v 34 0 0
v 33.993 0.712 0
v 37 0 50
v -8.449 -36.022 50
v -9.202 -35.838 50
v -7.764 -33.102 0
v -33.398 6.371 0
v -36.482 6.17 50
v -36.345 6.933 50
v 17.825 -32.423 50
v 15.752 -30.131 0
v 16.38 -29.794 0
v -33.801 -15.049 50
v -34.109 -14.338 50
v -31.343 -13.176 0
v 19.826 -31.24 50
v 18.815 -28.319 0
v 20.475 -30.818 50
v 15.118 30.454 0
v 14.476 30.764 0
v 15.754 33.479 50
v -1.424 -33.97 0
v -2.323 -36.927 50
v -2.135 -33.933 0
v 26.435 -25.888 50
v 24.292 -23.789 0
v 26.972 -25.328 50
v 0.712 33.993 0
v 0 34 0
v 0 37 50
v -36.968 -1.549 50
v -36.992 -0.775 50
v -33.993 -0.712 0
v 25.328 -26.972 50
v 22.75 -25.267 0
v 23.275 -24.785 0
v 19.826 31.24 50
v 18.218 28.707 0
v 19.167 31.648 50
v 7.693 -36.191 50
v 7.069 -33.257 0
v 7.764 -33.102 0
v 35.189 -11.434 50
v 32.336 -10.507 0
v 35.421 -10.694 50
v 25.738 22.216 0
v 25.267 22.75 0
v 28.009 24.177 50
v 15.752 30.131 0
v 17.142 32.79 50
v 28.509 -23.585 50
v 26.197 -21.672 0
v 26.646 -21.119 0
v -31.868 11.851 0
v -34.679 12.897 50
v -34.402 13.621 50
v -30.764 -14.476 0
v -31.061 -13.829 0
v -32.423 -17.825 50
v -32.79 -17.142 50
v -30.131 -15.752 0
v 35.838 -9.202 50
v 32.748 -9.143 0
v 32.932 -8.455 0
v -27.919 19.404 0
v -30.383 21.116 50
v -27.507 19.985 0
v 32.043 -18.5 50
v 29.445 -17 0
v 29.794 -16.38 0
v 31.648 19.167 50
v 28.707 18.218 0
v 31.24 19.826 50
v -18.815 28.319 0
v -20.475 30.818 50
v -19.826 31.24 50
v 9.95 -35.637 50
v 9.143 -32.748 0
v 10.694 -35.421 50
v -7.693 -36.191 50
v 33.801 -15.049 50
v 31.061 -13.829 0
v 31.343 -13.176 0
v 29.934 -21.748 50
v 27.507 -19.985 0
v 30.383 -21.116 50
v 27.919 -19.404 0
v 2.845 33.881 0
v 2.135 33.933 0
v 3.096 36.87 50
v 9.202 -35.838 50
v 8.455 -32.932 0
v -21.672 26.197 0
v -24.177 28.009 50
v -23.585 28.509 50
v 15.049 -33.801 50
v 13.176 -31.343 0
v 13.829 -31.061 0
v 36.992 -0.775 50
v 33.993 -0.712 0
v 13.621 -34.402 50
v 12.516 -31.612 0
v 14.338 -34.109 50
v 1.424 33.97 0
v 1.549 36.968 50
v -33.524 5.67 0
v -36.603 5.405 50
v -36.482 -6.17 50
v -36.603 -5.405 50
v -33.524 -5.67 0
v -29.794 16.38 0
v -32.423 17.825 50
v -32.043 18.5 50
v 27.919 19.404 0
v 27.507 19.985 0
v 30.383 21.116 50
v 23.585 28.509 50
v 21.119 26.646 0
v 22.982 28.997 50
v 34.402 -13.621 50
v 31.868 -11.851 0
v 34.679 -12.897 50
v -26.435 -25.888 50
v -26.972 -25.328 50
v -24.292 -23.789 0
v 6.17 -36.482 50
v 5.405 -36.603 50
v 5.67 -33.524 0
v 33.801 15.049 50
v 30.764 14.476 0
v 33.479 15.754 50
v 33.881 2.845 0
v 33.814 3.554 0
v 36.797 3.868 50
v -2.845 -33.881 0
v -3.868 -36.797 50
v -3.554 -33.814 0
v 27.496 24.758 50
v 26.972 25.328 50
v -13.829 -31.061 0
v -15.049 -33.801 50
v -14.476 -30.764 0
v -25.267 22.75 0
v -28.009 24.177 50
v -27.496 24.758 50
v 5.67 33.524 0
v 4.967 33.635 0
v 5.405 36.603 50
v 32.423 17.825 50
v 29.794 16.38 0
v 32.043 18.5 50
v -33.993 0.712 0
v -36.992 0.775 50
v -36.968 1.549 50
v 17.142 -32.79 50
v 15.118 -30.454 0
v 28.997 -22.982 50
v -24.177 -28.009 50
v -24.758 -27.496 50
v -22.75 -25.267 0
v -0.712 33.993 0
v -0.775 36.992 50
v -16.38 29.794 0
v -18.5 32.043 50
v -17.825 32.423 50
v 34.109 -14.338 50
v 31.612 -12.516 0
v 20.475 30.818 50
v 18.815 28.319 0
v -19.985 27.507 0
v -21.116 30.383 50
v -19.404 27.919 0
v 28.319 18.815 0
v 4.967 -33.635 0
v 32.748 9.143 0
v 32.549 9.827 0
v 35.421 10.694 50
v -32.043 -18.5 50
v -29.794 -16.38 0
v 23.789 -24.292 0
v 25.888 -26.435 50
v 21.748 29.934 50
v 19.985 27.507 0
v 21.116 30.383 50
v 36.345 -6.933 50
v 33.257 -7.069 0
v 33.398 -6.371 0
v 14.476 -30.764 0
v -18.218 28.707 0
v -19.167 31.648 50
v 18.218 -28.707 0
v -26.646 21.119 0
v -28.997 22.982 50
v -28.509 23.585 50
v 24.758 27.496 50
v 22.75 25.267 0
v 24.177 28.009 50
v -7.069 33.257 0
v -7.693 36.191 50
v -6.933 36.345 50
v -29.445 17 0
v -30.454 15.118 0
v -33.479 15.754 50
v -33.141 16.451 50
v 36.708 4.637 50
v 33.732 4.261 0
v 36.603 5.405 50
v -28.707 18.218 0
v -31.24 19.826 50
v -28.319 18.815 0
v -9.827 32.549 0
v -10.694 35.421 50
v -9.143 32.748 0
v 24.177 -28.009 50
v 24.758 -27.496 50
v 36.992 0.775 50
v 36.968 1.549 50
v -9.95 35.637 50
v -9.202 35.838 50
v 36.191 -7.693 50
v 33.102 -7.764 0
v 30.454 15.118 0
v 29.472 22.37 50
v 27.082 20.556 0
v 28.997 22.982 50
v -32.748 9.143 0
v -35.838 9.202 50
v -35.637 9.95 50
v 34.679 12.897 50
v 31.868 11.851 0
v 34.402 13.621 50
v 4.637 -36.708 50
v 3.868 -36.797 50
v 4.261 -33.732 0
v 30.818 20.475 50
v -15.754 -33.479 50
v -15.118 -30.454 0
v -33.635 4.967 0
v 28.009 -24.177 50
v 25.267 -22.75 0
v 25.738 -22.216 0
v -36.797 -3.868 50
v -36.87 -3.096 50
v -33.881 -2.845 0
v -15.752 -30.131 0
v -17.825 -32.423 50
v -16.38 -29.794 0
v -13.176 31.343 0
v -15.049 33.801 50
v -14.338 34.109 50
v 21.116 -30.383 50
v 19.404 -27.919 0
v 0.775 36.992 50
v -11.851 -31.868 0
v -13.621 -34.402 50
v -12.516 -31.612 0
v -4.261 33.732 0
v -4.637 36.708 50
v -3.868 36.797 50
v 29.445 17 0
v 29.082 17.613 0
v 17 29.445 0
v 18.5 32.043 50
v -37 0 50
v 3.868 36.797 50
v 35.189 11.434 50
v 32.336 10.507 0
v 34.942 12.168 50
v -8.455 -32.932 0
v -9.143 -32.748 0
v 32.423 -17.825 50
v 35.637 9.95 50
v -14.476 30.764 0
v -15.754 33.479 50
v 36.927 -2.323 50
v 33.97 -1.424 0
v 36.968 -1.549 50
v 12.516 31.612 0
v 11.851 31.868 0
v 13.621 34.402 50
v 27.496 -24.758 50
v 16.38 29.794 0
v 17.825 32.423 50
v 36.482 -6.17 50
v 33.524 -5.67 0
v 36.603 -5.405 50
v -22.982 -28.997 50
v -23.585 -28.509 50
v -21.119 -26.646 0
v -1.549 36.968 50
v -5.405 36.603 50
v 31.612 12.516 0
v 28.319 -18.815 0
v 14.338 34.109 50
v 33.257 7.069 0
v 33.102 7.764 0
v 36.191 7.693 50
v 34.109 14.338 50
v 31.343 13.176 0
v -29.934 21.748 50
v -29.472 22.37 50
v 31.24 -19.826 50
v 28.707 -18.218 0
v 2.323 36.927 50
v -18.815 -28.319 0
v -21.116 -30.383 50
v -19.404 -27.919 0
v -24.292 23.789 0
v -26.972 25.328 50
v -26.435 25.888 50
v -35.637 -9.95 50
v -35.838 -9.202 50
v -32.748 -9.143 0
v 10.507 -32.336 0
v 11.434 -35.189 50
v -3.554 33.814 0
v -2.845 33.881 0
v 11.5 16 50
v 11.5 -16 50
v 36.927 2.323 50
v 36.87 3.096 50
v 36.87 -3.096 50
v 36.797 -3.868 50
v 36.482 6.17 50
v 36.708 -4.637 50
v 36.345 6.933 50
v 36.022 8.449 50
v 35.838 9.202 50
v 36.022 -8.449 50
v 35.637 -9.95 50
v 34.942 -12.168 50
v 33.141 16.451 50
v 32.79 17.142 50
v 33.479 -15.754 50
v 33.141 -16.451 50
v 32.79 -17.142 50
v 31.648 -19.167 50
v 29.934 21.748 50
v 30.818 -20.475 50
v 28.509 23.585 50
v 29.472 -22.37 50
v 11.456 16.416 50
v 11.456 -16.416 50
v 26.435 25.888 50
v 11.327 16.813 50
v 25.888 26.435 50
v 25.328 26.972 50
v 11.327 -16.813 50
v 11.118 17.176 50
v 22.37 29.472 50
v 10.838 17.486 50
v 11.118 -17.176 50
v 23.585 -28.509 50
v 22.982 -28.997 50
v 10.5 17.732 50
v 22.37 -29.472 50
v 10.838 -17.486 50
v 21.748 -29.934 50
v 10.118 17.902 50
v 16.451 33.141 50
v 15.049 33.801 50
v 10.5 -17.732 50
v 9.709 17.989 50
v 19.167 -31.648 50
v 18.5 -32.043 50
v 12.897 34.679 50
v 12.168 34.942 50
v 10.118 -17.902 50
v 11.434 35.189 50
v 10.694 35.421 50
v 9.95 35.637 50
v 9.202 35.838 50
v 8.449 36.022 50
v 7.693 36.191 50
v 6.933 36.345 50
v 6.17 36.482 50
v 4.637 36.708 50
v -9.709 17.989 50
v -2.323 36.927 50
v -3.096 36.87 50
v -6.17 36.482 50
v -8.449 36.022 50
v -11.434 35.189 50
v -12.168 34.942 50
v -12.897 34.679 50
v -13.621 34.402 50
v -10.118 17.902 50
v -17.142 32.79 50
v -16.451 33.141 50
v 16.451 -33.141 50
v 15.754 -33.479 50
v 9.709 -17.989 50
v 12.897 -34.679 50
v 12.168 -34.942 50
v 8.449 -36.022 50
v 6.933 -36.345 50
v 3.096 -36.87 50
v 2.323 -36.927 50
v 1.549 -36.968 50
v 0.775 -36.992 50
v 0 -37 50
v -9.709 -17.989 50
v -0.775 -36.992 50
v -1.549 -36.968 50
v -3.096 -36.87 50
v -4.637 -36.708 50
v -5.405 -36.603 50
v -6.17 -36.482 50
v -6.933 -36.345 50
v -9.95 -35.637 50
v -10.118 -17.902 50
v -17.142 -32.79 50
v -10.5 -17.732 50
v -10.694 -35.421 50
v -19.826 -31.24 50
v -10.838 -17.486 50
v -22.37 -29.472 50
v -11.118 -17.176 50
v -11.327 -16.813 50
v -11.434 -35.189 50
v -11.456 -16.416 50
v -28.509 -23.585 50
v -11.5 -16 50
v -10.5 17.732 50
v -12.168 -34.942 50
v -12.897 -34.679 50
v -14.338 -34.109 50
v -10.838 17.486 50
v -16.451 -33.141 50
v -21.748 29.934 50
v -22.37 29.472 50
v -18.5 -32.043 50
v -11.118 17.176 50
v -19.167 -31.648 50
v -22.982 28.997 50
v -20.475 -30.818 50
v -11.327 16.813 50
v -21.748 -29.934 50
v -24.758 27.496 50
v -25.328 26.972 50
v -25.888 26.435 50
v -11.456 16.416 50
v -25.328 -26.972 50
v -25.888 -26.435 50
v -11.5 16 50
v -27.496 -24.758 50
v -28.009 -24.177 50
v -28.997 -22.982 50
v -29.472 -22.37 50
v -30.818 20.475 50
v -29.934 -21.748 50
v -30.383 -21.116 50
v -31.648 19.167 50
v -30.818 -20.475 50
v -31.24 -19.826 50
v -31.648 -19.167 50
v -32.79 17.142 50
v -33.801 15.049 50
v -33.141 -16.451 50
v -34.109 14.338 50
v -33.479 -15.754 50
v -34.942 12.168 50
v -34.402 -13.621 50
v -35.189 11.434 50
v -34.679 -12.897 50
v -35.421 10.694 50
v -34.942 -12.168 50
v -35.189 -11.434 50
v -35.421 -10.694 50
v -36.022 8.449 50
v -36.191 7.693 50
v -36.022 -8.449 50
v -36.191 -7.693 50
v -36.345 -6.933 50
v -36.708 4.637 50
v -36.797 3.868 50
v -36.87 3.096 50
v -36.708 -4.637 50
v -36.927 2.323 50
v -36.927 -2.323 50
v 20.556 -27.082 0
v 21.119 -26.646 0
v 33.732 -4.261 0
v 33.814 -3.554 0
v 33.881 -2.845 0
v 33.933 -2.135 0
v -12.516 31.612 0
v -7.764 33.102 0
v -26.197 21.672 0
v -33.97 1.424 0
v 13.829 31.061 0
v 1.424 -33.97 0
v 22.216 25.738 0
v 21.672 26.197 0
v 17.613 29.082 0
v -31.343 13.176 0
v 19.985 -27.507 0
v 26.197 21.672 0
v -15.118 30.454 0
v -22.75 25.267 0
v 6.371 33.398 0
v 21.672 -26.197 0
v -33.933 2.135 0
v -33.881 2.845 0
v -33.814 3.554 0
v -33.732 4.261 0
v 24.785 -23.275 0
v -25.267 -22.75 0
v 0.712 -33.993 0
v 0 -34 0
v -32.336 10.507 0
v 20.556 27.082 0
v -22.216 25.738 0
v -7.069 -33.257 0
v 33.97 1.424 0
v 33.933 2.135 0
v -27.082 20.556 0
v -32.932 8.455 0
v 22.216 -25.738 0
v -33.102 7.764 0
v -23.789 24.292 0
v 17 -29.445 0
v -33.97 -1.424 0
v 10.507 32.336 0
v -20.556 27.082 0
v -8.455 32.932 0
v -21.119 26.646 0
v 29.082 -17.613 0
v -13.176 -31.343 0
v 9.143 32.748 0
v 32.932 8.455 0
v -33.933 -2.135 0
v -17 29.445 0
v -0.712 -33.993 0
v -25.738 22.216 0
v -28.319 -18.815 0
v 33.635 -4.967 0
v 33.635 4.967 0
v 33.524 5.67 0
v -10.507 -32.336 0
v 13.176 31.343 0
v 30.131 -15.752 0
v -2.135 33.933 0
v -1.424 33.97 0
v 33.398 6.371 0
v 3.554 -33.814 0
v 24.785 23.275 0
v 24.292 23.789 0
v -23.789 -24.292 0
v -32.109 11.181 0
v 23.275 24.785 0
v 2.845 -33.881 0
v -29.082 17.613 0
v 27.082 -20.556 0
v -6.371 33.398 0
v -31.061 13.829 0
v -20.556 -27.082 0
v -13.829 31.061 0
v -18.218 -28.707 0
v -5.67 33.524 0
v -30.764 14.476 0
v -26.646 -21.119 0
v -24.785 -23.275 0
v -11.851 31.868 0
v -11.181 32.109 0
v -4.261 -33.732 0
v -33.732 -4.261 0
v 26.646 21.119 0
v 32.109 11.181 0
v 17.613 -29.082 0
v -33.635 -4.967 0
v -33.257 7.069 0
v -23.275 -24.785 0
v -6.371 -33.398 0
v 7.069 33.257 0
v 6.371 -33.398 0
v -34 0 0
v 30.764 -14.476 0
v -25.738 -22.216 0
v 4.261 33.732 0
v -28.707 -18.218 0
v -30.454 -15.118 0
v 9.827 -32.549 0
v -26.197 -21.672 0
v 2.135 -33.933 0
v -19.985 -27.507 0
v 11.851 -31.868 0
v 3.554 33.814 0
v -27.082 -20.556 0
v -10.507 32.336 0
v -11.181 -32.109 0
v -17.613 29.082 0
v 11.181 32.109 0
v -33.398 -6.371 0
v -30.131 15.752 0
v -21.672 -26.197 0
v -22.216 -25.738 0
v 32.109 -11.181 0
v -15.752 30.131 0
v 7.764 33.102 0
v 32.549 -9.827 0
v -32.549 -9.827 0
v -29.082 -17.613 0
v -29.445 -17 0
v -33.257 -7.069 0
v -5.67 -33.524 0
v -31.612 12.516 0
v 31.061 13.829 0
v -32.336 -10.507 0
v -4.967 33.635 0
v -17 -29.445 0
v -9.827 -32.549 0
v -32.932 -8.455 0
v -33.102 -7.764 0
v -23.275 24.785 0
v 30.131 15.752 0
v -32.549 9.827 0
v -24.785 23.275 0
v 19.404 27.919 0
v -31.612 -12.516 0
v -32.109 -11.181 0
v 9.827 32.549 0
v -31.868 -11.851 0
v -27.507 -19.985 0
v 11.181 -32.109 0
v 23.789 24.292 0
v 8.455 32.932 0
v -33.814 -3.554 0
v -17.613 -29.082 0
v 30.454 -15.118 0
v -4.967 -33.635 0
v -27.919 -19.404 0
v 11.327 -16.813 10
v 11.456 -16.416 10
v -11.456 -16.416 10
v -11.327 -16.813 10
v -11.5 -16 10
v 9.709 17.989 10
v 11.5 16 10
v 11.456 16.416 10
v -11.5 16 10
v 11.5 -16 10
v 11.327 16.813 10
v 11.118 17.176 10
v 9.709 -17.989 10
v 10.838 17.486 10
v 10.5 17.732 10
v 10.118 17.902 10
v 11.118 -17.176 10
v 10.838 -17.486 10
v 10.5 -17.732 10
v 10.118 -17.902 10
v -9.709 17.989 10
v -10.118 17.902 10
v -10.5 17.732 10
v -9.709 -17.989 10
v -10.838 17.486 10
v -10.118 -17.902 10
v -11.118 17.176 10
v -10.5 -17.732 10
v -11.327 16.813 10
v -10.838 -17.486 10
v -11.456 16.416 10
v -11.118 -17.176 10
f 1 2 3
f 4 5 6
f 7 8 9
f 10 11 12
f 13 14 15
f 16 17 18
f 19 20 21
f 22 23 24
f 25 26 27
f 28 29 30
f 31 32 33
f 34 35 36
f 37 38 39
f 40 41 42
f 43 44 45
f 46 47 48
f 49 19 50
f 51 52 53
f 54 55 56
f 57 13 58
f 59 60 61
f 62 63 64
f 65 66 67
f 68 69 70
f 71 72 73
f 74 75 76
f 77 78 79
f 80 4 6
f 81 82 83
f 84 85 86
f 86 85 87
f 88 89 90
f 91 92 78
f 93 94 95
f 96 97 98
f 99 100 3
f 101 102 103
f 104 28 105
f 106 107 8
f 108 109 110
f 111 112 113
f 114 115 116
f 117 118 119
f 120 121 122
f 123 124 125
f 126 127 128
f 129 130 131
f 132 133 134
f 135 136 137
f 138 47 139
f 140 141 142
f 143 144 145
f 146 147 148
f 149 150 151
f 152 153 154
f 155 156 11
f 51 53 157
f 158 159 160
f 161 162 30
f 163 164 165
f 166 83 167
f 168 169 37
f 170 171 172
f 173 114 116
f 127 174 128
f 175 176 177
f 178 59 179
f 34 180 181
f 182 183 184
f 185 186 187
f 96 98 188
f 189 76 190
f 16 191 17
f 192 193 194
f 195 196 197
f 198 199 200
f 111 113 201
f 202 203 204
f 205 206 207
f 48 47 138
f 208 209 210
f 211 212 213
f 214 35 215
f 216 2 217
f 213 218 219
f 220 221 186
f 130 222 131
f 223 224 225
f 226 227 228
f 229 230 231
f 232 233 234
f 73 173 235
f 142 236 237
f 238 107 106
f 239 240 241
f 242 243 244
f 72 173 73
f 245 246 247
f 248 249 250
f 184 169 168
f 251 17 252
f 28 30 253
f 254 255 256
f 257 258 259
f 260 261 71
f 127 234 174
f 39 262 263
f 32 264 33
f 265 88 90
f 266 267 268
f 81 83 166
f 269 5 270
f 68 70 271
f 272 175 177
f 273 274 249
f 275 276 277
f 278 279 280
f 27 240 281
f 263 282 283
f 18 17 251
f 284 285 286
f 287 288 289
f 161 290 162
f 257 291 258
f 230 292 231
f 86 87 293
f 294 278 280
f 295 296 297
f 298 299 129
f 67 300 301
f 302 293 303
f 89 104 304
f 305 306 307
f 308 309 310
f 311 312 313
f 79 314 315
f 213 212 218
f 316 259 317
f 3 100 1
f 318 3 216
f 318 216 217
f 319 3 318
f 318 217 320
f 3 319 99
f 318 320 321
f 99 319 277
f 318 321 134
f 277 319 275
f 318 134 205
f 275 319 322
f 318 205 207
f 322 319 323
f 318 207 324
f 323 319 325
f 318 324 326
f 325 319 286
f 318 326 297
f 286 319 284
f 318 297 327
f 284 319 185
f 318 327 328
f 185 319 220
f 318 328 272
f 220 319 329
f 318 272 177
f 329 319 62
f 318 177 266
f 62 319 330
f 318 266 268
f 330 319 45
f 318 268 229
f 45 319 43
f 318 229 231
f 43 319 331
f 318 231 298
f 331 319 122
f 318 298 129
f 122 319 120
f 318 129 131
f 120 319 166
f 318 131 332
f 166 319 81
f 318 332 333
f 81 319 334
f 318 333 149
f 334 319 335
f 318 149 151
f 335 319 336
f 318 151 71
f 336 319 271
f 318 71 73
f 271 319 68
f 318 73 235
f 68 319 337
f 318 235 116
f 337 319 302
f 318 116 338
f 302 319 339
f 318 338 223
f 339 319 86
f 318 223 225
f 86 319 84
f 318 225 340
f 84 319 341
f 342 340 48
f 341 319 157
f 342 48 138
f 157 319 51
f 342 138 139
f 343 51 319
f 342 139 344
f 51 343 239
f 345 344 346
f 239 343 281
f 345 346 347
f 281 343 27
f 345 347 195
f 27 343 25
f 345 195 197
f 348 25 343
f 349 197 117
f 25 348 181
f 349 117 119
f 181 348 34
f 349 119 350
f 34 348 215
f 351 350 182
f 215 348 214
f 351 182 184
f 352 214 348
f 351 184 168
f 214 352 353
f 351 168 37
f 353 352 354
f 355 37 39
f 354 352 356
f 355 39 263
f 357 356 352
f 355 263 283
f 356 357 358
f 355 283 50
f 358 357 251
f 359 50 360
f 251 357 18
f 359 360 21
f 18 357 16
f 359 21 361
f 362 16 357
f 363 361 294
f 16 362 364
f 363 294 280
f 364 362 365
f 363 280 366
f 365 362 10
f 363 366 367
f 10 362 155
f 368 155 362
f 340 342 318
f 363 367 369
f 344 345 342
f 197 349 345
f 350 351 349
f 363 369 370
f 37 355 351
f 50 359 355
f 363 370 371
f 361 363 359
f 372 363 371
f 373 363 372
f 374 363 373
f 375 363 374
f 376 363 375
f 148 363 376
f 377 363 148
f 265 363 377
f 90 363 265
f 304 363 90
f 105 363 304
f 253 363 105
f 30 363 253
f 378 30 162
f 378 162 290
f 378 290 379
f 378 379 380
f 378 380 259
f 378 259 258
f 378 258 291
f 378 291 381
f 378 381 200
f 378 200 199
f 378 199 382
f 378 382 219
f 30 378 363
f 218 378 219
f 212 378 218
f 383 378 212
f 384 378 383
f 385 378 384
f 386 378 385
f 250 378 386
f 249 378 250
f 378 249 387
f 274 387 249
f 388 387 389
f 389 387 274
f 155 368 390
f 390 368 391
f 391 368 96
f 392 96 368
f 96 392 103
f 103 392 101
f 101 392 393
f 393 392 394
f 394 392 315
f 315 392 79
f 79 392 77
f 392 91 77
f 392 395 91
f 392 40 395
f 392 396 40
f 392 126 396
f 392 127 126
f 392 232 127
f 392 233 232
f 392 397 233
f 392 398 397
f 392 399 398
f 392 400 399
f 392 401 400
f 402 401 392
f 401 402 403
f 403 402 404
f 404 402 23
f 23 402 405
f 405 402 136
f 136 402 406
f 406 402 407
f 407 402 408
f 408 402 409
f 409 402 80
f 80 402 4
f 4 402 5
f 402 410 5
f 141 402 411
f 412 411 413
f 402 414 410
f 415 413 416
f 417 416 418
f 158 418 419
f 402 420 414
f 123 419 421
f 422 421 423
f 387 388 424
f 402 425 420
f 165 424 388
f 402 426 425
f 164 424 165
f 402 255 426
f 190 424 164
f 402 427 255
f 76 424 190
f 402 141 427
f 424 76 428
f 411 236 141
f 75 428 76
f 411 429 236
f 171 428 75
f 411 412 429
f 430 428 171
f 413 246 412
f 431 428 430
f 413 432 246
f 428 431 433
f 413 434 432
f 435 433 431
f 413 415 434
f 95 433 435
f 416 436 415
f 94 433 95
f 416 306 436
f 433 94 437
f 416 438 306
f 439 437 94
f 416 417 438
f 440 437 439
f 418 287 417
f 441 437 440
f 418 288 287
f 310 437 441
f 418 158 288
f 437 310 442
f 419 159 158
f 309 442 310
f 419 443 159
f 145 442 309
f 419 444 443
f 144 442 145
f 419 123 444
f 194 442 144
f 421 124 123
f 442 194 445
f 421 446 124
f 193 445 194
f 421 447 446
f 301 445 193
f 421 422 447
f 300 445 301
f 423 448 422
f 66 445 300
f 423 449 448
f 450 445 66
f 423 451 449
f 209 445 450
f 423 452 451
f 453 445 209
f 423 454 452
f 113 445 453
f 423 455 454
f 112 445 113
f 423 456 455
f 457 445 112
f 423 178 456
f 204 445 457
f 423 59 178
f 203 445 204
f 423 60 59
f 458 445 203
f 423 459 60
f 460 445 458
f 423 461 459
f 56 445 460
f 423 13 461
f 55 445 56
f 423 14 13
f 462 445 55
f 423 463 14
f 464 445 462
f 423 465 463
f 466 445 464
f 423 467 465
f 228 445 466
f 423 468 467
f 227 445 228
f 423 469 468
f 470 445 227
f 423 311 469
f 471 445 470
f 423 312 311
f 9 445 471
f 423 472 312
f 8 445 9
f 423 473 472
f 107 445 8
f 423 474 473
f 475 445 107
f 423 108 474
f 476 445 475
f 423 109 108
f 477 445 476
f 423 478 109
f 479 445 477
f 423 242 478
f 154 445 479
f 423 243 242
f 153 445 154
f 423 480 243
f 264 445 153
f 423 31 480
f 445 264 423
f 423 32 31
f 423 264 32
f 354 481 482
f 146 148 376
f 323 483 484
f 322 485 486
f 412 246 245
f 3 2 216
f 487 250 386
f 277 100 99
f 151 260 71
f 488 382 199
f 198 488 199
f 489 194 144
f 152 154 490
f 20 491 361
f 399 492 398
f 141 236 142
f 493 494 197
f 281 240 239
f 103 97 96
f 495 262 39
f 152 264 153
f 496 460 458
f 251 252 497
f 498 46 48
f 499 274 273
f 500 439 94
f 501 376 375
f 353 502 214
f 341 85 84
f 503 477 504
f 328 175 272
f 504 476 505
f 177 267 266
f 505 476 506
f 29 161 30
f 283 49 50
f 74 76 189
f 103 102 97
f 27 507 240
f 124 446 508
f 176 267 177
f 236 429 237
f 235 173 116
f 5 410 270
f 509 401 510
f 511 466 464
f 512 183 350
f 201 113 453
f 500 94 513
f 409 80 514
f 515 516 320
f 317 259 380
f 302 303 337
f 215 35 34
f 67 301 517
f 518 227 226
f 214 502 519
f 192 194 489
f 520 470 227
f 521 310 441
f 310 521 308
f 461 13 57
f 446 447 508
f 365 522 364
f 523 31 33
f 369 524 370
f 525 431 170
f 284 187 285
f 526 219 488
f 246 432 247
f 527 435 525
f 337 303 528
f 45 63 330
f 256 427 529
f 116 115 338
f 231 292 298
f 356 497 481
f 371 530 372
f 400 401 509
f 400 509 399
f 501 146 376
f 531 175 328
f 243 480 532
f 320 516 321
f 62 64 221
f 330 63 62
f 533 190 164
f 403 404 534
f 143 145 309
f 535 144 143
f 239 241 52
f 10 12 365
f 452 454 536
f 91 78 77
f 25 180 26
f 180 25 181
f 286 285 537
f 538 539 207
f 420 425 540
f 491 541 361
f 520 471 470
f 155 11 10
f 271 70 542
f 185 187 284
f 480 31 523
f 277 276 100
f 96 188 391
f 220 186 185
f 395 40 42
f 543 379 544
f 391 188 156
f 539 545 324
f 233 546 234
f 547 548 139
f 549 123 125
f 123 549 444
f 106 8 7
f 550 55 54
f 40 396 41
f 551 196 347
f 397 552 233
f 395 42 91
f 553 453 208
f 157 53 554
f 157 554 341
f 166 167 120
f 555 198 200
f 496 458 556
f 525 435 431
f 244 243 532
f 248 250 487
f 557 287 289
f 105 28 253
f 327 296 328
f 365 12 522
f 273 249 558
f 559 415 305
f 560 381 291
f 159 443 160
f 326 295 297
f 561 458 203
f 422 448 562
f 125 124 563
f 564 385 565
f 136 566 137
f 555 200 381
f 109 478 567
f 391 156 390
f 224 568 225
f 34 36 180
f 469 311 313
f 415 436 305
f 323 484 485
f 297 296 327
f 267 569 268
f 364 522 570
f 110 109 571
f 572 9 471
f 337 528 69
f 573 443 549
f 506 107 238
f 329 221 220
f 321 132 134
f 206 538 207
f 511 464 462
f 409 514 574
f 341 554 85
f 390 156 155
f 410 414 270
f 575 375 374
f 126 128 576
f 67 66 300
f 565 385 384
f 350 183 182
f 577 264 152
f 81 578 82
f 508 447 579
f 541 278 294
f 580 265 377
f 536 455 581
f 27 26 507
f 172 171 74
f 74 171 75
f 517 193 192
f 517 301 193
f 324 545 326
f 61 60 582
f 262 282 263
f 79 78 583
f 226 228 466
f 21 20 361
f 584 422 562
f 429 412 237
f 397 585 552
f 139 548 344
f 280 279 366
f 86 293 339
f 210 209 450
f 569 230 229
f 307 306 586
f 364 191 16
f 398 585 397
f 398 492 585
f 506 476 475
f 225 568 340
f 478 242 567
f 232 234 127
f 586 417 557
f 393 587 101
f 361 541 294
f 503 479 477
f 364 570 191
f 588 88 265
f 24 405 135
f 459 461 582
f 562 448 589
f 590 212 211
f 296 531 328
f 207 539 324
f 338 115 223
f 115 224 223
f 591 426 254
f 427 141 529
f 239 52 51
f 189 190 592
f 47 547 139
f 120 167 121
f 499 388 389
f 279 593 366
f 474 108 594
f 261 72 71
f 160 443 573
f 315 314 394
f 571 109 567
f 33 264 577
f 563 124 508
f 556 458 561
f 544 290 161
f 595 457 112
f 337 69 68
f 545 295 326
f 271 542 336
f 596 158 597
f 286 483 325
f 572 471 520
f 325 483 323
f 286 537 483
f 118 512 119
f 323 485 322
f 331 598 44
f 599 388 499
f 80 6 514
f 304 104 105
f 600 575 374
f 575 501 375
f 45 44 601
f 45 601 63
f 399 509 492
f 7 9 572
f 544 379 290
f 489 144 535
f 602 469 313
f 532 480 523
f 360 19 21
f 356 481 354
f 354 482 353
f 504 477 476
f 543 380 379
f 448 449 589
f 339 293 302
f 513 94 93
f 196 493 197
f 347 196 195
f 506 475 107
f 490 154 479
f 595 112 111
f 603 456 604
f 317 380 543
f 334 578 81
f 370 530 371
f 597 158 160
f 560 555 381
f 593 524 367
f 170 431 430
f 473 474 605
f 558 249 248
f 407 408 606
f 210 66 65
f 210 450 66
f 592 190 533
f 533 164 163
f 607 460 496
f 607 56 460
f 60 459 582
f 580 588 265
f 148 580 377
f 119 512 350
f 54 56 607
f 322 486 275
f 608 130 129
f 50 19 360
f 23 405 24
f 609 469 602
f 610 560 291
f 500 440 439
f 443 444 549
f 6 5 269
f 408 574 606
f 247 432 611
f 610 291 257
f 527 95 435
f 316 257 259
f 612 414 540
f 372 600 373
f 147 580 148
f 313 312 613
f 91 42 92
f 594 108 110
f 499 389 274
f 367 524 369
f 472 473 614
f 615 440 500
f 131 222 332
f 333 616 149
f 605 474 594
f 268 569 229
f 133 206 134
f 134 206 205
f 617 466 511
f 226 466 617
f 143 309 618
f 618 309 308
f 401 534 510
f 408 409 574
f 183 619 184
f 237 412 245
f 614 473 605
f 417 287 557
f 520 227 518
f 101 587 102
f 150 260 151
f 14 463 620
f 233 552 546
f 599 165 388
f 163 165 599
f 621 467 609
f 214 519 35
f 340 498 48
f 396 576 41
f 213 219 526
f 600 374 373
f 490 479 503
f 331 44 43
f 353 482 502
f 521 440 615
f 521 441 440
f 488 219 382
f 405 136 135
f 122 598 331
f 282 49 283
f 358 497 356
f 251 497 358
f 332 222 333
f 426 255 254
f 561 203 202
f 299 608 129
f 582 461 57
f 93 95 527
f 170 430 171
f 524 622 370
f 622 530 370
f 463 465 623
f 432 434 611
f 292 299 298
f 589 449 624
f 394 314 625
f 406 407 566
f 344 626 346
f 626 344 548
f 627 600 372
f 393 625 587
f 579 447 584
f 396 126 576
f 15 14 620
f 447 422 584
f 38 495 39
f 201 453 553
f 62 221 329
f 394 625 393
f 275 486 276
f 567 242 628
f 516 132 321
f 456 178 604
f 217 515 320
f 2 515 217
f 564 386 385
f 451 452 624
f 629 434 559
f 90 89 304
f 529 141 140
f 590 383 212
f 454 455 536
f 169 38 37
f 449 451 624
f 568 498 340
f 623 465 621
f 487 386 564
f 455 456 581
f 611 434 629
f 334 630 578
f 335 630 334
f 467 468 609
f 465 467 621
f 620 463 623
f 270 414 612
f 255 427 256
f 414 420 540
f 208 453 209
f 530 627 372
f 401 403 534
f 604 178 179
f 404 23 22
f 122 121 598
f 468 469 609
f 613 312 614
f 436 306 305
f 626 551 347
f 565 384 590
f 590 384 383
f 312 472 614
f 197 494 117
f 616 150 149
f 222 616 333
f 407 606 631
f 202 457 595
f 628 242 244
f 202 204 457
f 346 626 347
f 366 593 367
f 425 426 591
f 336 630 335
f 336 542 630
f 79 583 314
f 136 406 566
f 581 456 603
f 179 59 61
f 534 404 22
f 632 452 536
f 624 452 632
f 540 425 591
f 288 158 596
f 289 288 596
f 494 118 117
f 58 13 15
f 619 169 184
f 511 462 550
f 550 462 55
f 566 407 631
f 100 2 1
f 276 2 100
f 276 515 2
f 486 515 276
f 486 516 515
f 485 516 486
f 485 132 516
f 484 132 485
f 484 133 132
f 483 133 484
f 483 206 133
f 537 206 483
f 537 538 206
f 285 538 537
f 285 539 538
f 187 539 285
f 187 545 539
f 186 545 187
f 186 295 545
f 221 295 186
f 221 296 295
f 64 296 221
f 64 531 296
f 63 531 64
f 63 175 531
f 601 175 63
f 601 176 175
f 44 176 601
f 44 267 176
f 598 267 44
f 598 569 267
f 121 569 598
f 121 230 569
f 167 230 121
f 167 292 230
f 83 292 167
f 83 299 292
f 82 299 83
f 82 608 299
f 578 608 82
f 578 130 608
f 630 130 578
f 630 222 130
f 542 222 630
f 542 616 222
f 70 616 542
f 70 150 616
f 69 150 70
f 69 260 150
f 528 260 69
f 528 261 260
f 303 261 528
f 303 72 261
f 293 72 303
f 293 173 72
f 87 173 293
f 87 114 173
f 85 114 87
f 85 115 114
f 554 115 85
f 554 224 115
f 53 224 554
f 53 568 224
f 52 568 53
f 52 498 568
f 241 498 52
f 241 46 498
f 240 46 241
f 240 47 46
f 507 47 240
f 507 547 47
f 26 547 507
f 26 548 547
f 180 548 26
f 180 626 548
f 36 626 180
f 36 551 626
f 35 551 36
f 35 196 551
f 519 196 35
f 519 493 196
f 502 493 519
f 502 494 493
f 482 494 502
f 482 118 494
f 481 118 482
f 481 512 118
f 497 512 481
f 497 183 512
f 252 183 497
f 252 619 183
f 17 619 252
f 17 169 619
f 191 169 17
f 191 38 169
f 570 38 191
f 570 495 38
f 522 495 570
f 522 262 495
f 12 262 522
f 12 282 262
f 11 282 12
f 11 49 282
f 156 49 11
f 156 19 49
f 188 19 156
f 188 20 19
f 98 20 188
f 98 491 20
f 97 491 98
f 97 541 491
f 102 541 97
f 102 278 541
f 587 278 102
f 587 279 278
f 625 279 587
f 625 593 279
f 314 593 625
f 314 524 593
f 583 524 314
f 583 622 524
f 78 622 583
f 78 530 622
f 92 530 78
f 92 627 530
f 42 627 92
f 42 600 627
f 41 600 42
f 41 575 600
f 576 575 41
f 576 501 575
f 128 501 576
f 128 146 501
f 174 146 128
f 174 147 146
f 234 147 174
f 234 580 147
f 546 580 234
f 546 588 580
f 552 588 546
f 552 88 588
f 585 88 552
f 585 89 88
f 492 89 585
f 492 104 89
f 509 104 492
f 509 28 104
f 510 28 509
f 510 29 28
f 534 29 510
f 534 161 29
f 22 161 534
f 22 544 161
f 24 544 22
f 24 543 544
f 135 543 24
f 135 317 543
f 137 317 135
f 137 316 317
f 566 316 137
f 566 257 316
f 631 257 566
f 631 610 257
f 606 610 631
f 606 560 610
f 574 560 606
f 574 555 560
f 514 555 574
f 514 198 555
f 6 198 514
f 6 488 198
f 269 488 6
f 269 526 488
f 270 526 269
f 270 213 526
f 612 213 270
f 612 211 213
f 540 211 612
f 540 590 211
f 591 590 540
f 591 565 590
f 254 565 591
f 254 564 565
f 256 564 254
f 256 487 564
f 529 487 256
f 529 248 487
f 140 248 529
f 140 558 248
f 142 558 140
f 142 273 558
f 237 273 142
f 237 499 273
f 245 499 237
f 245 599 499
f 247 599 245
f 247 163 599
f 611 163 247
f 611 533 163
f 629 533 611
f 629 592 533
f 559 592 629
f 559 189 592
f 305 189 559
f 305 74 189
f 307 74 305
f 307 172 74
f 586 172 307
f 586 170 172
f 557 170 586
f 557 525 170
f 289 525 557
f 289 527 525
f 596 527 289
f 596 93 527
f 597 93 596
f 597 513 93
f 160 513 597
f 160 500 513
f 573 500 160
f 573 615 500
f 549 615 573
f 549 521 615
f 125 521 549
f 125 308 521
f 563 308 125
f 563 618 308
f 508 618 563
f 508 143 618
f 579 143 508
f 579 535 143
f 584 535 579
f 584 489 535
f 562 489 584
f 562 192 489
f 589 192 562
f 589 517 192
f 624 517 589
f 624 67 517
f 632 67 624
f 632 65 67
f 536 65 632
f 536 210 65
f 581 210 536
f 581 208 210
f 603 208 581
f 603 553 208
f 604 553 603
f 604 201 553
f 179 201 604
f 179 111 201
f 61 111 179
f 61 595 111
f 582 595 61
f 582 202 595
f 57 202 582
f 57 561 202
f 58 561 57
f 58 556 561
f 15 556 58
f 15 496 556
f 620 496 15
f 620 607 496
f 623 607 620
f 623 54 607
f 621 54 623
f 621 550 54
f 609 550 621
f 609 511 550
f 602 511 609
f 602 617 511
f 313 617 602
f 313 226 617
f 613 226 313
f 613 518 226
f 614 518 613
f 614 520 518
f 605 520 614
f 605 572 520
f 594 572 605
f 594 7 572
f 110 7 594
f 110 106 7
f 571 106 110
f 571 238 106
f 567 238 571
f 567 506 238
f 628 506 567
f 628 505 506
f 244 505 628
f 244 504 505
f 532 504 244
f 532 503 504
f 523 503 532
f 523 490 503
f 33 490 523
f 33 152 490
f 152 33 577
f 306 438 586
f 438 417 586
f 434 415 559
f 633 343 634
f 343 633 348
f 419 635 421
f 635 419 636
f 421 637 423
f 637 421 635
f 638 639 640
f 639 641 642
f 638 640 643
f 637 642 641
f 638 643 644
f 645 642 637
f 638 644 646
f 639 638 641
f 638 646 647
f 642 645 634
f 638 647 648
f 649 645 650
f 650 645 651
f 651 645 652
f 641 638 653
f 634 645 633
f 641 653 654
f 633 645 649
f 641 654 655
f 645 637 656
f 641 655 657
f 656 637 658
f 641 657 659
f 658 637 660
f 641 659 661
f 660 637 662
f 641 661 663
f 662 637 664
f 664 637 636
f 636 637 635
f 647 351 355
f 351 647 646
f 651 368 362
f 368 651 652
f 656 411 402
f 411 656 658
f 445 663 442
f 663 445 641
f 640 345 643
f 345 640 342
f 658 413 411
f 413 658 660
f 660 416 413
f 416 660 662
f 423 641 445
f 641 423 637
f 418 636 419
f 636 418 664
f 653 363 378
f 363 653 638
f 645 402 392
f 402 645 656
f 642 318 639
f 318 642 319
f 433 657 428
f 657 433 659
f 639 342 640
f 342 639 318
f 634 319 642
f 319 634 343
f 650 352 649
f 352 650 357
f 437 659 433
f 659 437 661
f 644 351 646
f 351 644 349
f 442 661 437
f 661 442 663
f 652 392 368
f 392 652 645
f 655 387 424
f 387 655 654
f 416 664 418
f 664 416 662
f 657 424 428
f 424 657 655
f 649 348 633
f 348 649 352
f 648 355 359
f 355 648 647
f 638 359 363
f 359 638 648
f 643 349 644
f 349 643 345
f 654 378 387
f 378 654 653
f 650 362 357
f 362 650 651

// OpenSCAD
Cone_Height = 50; 
Upper_Radius = 37; 
Lower_Radius = 34; 

Ecig_body_Width= 23; 
Ecig_body_Length = 36; 
Bottom_Wall_Height = 10;
// - Corner radius (optional)
Corner_radius = 2;


difference  (){

translate([0,0,0]) cylinder( h = Cone_Height, r2 = Upper_Radius , r1 = Lower_Radius , $fn=300);
 roundedRect([Ecig_body_Width, Ecig_body_Length,Cone_Height +2],  Corner_radius, $fn=30);

}

module roundedRect(size, radius)
{
	x = size[0];
	y = size[1];
	z = size[2];

	translate ([0,0,Bottom_Wall_Height ]) linear_extrude(height=z+2)
	hull()
	{

		translate([(-x/2)+(radius), (-y/2)+(radius), 0])
		circle(r=radius);
	
		translate([(x/2)-(radius), (-y/2)+(radius), 0])
		circle(r=radius);
        
		translate([(-x/2)+(radius), (y/2)-(radius), 0])
		circle(r=radius);
	
		translate([(x/2)-(radius), (y/2)-(radius), 0])
		circle(r=radius); 

	}
} 
